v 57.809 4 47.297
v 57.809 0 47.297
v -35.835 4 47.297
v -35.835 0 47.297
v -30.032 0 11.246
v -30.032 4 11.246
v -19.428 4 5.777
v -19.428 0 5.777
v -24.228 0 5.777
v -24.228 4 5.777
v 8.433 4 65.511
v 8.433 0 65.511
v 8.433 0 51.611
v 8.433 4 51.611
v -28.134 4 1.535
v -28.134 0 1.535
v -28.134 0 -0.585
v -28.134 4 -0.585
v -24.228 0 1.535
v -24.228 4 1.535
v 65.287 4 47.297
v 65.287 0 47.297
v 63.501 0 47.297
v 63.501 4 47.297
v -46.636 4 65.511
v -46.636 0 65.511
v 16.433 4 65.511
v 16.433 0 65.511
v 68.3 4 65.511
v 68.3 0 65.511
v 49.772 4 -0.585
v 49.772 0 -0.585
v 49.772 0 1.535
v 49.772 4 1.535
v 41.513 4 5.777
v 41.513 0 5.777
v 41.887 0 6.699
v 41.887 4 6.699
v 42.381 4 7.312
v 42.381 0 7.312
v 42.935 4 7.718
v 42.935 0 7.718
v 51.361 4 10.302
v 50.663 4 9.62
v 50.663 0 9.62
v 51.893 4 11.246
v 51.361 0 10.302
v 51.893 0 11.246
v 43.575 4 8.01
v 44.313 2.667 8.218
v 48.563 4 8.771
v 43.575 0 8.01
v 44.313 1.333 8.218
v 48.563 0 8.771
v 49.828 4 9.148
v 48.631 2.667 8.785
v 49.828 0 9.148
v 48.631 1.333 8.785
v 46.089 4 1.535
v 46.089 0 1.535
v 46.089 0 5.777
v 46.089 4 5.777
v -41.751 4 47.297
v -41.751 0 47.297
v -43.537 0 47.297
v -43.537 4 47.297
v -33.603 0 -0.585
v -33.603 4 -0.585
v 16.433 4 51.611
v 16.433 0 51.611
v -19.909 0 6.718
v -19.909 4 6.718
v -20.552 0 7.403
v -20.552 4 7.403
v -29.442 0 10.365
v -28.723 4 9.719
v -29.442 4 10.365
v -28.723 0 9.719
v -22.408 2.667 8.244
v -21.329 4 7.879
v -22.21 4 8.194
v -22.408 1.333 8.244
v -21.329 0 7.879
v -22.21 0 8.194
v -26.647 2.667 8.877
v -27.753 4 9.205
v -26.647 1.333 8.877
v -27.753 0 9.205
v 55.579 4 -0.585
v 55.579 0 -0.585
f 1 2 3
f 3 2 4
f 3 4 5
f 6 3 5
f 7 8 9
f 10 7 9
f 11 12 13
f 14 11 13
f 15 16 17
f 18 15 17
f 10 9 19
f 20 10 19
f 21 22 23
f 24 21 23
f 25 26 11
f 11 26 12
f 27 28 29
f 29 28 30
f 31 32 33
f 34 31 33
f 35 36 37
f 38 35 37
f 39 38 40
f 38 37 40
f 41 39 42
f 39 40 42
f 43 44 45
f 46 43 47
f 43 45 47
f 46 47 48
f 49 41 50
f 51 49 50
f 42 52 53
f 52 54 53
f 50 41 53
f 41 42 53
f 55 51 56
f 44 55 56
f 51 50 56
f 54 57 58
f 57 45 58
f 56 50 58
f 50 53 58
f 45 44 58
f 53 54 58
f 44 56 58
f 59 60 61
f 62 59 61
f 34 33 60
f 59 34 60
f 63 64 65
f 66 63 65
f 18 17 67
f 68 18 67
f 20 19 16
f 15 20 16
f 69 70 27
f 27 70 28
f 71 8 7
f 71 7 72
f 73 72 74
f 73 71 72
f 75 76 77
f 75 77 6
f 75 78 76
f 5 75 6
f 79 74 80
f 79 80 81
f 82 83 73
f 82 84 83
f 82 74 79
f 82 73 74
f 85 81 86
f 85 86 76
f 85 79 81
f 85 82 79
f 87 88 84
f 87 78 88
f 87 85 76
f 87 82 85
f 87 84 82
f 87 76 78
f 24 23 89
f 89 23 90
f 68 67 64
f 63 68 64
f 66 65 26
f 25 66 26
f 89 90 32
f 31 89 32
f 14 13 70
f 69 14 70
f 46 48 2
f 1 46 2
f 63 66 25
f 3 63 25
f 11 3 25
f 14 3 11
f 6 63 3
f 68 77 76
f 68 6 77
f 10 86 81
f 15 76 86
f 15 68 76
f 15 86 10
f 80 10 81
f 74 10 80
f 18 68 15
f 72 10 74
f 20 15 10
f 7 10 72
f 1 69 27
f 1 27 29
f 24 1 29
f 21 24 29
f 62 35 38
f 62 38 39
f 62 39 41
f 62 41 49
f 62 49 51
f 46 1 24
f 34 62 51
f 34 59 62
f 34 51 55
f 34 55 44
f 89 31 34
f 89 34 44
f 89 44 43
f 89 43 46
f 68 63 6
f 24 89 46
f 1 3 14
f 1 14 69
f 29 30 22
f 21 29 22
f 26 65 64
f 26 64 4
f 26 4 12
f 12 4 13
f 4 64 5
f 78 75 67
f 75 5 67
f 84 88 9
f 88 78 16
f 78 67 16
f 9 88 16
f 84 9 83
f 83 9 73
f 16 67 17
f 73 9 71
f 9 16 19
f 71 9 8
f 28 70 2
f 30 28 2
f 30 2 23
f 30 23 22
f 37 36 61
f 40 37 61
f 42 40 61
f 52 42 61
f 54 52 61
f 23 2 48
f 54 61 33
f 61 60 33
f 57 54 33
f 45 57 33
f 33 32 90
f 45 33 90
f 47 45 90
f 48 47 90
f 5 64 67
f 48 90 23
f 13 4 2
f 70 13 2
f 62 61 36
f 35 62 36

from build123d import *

# Parameters (mm, degrees)
EXTRUDE_1_DEPTH = 4


with BuildPart() as part:
    # 草图1 → 凸台-拉伸1 (new body)
    with BuildSketch(Plane(origin=(0, 0, 0), x_dir=(1, 0, 0), z_dir=(0, 1, 0))):
        with BuildLine():
            Line((-19.428200902, -5.776577465), (-24.227594621, -5.776577465))
            Line((-24.227594621, -5.776577465), (-24.227594621, -1.535252783))
            Line((-24.227594621, -1.535252783), (-28.134077881, -1.535252783))
            Line((-28.134077881, -1.535252783), (-28.134077881, 0.585409558))
            Line((-28.134077881, 0.585409558), (-33.603154445, 0.585409558))
            Line((-33.603154445, 0.585409558), (-41.750962387, -47.296913826))
            Line((-41.750962387, -47.296913826), (-43.536783306, -47.296913826))
            Line((-43.536783306, -47.296913826), (-46.636151448, -65.511008799))
            Line((-46.636151448, -65.511008799), (8.433030865, -65.511008799))
            Line((8.433030865, -65.511008799), (8.433030865, -51.611008799))
            Line((8.433030865, -51.611008799), (16.433030865, -51.611008799))
            Line((16.433030865, -51.611008799), (16.433030865, -65.511008799))
            Line((16.433030865, -65.511008799), (68.300251733, -65.511008799))
            Line((68.300251733, -65.511008799), (65.286678932, -47.296913826))
            Line((65.286678932, -47.296913826), (63.500858013, -47.296913826))
            Line((63.500858013, -47.296913826), (55.578594097, 0.585409558))
            Line((55.578594097, 0.585409558), (49.7723597, 0.585409558))
            Line((49.7723597, 0.585409558), (49.7723597, -1.535252783))
            Line((49.7723597, -1.535252783), (46.089104055, -1.535252783))
            Line((46.089104055, -1.535252783), (46.089104055, -5.776577465))
            Line((46.089104055, -5.776577465), (41.512937951, -5.776577465))
            add(Edge.make_bspline(
                [(41.512937951, -5.776577465), (42.69533512, -10.410562899), (50.01726791, -6.582058067), (51.893022041, -11.245654029)],
                knots=[0, 0, 0, 0, 1, 1, 1, 1], degree=3))
            Line((51.893022041, -11.245654029), (57.808553835, -47.296913826))
            Line((57.808553835, -47.296913826), (-35.835430593, -47.296913826))
            Line((-35.835430593, -47.296913826), (-30.031512607, -11.245654029))
            add(Edge.make_bspline(
                [(-19.428200902, -5.776577465), (-21.07412713, -10.350937498), (-27.778264505, -6.819763811), (-30.031512607, -11.245654029)],
                knots=[0, 0, 0, 0, 1, 1, 1, 1], degree=3))
        make_face()
    extrude(amount=EXTRUDE_1_DEPTH)


solid = part.part
